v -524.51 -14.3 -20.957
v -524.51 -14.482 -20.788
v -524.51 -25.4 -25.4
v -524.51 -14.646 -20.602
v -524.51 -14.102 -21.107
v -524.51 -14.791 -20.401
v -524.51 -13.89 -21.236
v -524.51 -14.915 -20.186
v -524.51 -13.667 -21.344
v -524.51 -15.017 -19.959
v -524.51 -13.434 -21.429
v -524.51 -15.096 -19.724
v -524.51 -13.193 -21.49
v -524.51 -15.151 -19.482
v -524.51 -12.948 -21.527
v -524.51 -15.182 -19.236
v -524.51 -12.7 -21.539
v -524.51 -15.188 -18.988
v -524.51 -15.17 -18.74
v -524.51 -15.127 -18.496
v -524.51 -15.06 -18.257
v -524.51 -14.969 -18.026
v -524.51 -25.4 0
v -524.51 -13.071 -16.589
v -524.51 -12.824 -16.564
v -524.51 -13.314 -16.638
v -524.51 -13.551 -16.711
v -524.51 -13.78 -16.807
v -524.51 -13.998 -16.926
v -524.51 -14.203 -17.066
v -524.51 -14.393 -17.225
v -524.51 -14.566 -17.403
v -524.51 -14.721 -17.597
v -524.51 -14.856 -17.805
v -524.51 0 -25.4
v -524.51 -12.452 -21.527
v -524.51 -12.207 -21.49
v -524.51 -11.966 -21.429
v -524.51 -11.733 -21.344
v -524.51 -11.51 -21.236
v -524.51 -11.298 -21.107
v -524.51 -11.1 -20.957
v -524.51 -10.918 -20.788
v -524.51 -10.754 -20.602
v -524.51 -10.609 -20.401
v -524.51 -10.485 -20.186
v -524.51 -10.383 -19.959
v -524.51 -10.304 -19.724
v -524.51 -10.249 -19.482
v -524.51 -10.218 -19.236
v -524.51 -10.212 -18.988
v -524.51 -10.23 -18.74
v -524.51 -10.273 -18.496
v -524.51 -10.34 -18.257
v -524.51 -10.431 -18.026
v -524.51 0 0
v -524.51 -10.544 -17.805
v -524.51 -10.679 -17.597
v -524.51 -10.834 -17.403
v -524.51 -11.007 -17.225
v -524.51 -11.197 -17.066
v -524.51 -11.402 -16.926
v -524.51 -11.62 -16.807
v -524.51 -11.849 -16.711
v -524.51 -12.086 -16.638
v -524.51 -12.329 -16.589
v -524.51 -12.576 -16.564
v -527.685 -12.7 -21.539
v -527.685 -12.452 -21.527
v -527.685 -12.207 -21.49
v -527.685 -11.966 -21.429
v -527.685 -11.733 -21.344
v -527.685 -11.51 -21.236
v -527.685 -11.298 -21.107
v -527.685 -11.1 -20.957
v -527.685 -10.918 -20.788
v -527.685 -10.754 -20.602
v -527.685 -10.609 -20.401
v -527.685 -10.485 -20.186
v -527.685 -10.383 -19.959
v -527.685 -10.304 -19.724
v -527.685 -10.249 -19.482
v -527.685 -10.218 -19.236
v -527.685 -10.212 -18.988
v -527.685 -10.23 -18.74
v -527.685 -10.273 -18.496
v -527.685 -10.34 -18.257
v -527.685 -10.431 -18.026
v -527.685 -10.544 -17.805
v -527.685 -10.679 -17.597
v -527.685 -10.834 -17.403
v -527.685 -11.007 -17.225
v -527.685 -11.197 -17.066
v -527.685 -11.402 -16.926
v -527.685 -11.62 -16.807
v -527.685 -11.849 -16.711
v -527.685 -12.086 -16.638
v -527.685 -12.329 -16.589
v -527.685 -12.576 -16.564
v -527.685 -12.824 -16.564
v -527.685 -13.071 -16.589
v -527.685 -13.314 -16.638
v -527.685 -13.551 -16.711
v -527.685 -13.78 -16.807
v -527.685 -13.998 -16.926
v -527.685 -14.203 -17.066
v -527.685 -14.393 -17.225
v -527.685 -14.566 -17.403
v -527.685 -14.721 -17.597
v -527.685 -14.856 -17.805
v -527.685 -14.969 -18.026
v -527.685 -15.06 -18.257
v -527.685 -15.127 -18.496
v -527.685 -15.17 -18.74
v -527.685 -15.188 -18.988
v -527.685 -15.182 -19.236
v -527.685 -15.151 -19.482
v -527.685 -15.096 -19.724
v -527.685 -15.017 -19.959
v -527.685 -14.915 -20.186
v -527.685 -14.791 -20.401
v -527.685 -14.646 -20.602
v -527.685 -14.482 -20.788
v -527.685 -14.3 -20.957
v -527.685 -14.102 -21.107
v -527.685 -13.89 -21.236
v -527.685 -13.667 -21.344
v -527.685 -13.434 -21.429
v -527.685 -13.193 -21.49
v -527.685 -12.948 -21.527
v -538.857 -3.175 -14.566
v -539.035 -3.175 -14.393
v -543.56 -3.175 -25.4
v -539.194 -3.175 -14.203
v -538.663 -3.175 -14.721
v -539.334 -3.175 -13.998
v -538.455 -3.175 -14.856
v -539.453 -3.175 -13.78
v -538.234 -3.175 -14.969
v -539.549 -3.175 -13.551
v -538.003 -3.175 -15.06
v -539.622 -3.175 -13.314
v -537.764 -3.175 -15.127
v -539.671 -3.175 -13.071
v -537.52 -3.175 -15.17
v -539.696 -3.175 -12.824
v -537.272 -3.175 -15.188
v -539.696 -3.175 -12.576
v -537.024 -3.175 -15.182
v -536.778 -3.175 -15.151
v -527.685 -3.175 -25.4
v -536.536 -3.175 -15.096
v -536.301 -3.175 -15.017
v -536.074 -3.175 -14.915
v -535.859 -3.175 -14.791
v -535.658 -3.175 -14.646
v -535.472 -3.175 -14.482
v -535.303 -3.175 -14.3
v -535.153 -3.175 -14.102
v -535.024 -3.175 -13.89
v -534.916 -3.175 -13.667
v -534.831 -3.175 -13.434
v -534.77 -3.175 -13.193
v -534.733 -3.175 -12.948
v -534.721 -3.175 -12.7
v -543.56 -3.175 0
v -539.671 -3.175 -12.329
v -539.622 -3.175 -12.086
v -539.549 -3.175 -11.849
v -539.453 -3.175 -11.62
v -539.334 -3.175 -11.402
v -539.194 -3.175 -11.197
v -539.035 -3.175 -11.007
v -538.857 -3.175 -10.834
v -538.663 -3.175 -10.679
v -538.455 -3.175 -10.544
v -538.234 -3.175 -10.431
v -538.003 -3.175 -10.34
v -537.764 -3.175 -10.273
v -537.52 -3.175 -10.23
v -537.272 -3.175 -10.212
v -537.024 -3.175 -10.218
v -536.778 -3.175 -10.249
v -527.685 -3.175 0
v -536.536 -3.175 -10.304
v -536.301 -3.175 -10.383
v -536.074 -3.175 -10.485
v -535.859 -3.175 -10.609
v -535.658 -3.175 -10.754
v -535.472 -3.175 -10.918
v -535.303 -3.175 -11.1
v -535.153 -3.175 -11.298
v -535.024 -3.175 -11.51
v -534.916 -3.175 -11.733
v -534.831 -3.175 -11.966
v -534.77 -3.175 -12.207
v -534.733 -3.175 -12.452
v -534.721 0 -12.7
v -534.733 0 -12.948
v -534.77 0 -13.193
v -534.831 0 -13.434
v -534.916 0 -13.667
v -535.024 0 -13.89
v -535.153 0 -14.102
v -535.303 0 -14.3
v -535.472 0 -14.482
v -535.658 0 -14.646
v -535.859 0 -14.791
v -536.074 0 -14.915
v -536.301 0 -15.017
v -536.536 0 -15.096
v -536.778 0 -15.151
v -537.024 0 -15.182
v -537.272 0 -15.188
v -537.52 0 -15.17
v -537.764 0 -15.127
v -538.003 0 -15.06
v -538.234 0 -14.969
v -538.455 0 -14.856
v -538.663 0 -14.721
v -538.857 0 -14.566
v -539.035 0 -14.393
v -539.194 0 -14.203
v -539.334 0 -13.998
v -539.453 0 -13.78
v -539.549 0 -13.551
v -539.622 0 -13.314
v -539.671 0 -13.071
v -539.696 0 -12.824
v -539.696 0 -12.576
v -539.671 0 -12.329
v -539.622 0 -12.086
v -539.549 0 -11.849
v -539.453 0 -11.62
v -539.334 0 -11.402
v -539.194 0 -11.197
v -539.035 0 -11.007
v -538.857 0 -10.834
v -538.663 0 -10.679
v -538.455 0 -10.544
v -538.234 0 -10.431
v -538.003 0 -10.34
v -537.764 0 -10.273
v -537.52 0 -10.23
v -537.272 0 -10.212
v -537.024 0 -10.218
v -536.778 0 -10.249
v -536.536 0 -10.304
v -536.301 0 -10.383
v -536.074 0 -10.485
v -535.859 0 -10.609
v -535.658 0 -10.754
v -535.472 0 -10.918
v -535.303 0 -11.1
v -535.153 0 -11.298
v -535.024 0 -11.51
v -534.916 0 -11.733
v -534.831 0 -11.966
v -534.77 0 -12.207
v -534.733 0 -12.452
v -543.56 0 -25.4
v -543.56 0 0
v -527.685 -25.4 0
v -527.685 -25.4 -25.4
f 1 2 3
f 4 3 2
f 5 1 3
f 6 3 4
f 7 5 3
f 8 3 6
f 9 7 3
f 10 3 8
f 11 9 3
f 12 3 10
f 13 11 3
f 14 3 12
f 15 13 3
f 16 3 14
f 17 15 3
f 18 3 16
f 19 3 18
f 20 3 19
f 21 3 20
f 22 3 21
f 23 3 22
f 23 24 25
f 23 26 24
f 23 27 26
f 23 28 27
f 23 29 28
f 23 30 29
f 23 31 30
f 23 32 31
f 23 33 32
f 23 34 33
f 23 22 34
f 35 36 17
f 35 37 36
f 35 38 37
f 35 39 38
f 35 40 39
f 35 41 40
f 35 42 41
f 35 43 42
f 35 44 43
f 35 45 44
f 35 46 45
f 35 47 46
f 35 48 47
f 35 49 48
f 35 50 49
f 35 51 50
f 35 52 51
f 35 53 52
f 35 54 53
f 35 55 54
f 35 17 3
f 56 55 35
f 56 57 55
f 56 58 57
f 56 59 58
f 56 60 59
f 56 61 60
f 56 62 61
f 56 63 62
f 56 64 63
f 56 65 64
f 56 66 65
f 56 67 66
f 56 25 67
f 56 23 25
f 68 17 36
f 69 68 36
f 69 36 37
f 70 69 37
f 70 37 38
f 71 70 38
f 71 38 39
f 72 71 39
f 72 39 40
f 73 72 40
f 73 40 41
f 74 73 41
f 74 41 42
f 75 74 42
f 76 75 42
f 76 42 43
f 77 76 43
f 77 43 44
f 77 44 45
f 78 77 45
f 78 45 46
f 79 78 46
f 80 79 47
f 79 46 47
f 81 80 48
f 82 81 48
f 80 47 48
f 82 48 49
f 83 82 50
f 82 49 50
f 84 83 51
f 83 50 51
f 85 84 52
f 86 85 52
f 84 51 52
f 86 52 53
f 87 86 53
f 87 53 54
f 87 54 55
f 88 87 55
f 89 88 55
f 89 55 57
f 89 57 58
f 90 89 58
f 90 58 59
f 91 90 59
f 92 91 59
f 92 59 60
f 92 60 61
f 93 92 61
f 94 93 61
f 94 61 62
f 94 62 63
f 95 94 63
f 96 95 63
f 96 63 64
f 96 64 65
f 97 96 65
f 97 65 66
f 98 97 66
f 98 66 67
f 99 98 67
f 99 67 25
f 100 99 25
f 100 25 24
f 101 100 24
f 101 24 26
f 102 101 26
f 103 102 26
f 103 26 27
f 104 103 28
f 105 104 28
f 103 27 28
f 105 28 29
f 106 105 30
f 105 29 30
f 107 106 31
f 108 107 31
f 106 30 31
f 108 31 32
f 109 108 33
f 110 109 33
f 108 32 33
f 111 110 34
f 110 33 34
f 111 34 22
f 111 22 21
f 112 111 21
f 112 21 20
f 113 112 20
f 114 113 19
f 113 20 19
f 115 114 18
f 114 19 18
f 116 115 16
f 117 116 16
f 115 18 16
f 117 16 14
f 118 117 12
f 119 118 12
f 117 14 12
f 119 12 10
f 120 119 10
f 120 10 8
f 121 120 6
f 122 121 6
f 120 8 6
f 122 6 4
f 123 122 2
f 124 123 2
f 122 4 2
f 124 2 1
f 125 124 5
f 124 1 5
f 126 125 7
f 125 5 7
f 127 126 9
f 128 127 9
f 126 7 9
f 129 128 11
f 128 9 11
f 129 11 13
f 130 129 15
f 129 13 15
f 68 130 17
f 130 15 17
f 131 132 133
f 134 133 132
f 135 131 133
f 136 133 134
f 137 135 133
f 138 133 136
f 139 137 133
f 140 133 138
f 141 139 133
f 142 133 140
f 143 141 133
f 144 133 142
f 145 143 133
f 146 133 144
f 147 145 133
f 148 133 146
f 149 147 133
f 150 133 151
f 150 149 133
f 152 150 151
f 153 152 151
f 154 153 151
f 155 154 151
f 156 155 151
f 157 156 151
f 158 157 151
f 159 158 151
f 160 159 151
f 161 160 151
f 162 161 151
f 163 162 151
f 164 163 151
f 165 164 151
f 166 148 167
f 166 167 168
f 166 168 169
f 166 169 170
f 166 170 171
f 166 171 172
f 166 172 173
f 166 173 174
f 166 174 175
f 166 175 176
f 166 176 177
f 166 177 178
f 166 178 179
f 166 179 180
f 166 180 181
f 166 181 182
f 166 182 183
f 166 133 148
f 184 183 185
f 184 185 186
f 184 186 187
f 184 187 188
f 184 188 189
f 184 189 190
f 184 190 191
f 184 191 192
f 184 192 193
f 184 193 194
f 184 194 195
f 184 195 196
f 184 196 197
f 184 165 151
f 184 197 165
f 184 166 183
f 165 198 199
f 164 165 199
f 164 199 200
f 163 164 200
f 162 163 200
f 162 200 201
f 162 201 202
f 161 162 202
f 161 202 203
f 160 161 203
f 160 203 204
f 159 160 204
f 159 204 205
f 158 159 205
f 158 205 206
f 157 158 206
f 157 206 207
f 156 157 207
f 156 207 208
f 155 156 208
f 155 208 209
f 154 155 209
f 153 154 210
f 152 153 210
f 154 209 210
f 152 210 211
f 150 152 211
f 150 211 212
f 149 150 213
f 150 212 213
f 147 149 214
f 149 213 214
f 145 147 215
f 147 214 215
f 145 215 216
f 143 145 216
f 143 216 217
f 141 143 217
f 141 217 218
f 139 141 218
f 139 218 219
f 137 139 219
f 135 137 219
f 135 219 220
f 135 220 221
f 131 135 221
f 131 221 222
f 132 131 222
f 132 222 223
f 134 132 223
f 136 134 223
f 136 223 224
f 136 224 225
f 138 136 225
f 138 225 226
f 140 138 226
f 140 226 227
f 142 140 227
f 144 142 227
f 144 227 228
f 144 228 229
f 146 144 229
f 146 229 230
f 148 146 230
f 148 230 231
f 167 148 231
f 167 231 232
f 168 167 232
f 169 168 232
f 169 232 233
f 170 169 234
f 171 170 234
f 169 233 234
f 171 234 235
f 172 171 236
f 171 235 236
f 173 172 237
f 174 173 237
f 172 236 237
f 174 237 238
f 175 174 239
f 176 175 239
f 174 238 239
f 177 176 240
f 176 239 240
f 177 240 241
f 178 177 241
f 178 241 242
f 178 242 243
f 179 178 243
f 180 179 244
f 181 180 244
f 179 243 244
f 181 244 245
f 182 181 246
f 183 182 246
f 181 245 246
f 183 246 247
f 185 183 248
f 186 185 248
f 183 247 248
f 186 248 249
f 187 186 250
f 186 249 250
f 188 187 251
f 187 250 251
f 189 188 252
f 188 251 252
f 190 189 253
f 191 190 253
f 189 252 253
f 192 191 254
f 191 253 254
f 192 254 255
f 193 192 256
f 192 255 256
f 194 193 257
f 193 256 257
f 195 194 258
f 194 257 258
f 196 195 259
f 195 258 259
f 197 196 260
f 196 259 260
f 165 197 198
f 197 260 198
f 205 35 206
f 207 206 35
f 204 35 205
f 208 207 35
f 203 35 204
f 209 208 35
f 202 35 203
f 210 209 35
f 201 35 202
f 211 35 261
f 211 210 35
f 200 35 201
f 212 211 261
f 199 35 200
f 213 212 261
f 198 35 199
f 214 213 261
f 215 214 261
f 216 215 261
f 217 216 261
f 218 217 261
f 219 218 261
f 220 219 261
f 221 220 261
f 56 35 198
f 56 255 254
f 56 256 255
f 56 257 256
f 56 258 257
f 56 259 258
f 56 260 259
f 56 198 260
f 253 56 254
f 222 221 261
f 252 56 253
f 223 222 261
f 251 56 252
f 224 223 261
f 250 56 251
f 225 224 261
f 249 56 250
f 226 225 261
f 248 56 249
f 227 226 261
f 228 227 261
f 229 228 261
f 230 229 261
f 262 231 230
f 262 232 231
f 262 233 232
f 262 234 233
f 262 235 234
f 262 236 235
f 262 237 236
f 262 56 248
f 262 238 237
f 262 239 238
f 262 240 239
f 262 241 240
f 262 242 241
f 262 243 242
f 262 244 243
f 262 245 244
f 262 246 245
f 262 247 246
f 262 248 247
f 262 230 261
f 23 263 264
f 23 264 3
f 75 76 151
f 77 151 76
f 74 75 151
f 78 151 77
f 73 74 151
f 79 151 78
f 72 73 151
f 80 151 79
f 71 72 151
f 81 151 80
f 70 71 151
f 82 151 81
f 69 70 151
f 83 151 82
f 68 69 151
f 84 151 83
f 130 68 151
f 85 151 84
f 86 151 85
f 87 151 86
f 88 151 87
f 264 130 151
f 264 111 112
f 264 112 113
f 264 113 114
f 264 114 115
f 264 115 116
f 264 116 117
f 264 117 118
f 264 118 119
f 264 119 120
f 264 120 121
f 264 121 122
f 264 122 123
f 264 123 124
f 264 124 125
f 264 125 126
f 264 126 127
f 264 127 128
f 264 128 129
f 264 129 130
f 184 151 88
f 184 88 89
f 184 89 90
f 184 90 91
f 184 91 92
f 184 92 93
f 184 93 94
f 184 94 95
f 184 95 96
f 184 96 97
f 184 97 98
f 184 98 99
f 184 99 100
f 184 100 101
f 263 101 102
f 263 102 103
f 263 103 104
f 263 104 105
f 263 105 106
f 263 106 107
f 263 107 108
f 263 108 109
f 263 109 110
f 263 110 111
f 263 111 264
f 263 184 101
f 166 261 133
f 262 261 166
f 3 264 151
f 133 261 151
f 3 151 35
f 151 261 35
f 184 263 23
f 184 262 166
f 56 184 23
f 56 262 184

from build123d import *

# Parameters (mm, degrees)
EXTRUDE_THIN1_DEPTH            = 25.4
F_9_0_196_DIAMETER_HOLE1_D     = 4.9784
F_9_0_196_DIAMETER_HOLE1_DEPTH = 3.175
F_9_0_196_DIAMETER_HOLE3_D     = 4.9784
F_9_0_196_DIAMETER_HOLE3_DEPTH = 3.175
SKETCH11_W                     = 25.4
SKETCH11_H                     = 3.175
CUT_EXTRUDE1_DEPTH             = 6.35


with BuildPart() as part:
    # Sketch1 → Extrude-Thin1 (new body)
    with BuildSketch(Plane.XY):
        Polygon((-524.51, -25.4), (-524.51, 0), (-549.91, 0), (-549.91, -3.175), (-527.685, -3.175), (-527.685, -25.4), align=None)
    extrude(amount=-EXTRUDE_THIN1_DEPTH)

    # #9 (0.196) Diameter Hole1
    with Locations(Plane.ZY.offset(527.685)):
        with Locations((-19.05, -12.7)):
            Hole(F_9_0_196_DIAMETER_HOLE1_D / 2, depth=F_9_0_196_DIAMETER_HOLE1_DEPTH)

    # #9 (0.196) Diameter Hole3
    with Locations(Plane(origin=(0, -3.175, 0), x_dir=(-1, 0, 0), z_dir=(0, -1, 0))):
        with Locations((537.21, 12.7)):
            Hole(F_9_0_196_DIAMETER_HOLE3_D / 2, depth=F_9_0_196_DIAMETER_HOLE3_DEPTH)

    # Sketch11 → Cut-Extrude1 (cut)
    with BuildSketch(Plane.ZY.offset(549.91)):
        with Locations((-12.7, -1.5875)):
            Rectangle(SKETCH11_W, SKETCH11_H)
    extrude(amount=-CUT_EXTRUDE1_DEPTH, mode=Mode.SUBTRACT)


solid = part.part
